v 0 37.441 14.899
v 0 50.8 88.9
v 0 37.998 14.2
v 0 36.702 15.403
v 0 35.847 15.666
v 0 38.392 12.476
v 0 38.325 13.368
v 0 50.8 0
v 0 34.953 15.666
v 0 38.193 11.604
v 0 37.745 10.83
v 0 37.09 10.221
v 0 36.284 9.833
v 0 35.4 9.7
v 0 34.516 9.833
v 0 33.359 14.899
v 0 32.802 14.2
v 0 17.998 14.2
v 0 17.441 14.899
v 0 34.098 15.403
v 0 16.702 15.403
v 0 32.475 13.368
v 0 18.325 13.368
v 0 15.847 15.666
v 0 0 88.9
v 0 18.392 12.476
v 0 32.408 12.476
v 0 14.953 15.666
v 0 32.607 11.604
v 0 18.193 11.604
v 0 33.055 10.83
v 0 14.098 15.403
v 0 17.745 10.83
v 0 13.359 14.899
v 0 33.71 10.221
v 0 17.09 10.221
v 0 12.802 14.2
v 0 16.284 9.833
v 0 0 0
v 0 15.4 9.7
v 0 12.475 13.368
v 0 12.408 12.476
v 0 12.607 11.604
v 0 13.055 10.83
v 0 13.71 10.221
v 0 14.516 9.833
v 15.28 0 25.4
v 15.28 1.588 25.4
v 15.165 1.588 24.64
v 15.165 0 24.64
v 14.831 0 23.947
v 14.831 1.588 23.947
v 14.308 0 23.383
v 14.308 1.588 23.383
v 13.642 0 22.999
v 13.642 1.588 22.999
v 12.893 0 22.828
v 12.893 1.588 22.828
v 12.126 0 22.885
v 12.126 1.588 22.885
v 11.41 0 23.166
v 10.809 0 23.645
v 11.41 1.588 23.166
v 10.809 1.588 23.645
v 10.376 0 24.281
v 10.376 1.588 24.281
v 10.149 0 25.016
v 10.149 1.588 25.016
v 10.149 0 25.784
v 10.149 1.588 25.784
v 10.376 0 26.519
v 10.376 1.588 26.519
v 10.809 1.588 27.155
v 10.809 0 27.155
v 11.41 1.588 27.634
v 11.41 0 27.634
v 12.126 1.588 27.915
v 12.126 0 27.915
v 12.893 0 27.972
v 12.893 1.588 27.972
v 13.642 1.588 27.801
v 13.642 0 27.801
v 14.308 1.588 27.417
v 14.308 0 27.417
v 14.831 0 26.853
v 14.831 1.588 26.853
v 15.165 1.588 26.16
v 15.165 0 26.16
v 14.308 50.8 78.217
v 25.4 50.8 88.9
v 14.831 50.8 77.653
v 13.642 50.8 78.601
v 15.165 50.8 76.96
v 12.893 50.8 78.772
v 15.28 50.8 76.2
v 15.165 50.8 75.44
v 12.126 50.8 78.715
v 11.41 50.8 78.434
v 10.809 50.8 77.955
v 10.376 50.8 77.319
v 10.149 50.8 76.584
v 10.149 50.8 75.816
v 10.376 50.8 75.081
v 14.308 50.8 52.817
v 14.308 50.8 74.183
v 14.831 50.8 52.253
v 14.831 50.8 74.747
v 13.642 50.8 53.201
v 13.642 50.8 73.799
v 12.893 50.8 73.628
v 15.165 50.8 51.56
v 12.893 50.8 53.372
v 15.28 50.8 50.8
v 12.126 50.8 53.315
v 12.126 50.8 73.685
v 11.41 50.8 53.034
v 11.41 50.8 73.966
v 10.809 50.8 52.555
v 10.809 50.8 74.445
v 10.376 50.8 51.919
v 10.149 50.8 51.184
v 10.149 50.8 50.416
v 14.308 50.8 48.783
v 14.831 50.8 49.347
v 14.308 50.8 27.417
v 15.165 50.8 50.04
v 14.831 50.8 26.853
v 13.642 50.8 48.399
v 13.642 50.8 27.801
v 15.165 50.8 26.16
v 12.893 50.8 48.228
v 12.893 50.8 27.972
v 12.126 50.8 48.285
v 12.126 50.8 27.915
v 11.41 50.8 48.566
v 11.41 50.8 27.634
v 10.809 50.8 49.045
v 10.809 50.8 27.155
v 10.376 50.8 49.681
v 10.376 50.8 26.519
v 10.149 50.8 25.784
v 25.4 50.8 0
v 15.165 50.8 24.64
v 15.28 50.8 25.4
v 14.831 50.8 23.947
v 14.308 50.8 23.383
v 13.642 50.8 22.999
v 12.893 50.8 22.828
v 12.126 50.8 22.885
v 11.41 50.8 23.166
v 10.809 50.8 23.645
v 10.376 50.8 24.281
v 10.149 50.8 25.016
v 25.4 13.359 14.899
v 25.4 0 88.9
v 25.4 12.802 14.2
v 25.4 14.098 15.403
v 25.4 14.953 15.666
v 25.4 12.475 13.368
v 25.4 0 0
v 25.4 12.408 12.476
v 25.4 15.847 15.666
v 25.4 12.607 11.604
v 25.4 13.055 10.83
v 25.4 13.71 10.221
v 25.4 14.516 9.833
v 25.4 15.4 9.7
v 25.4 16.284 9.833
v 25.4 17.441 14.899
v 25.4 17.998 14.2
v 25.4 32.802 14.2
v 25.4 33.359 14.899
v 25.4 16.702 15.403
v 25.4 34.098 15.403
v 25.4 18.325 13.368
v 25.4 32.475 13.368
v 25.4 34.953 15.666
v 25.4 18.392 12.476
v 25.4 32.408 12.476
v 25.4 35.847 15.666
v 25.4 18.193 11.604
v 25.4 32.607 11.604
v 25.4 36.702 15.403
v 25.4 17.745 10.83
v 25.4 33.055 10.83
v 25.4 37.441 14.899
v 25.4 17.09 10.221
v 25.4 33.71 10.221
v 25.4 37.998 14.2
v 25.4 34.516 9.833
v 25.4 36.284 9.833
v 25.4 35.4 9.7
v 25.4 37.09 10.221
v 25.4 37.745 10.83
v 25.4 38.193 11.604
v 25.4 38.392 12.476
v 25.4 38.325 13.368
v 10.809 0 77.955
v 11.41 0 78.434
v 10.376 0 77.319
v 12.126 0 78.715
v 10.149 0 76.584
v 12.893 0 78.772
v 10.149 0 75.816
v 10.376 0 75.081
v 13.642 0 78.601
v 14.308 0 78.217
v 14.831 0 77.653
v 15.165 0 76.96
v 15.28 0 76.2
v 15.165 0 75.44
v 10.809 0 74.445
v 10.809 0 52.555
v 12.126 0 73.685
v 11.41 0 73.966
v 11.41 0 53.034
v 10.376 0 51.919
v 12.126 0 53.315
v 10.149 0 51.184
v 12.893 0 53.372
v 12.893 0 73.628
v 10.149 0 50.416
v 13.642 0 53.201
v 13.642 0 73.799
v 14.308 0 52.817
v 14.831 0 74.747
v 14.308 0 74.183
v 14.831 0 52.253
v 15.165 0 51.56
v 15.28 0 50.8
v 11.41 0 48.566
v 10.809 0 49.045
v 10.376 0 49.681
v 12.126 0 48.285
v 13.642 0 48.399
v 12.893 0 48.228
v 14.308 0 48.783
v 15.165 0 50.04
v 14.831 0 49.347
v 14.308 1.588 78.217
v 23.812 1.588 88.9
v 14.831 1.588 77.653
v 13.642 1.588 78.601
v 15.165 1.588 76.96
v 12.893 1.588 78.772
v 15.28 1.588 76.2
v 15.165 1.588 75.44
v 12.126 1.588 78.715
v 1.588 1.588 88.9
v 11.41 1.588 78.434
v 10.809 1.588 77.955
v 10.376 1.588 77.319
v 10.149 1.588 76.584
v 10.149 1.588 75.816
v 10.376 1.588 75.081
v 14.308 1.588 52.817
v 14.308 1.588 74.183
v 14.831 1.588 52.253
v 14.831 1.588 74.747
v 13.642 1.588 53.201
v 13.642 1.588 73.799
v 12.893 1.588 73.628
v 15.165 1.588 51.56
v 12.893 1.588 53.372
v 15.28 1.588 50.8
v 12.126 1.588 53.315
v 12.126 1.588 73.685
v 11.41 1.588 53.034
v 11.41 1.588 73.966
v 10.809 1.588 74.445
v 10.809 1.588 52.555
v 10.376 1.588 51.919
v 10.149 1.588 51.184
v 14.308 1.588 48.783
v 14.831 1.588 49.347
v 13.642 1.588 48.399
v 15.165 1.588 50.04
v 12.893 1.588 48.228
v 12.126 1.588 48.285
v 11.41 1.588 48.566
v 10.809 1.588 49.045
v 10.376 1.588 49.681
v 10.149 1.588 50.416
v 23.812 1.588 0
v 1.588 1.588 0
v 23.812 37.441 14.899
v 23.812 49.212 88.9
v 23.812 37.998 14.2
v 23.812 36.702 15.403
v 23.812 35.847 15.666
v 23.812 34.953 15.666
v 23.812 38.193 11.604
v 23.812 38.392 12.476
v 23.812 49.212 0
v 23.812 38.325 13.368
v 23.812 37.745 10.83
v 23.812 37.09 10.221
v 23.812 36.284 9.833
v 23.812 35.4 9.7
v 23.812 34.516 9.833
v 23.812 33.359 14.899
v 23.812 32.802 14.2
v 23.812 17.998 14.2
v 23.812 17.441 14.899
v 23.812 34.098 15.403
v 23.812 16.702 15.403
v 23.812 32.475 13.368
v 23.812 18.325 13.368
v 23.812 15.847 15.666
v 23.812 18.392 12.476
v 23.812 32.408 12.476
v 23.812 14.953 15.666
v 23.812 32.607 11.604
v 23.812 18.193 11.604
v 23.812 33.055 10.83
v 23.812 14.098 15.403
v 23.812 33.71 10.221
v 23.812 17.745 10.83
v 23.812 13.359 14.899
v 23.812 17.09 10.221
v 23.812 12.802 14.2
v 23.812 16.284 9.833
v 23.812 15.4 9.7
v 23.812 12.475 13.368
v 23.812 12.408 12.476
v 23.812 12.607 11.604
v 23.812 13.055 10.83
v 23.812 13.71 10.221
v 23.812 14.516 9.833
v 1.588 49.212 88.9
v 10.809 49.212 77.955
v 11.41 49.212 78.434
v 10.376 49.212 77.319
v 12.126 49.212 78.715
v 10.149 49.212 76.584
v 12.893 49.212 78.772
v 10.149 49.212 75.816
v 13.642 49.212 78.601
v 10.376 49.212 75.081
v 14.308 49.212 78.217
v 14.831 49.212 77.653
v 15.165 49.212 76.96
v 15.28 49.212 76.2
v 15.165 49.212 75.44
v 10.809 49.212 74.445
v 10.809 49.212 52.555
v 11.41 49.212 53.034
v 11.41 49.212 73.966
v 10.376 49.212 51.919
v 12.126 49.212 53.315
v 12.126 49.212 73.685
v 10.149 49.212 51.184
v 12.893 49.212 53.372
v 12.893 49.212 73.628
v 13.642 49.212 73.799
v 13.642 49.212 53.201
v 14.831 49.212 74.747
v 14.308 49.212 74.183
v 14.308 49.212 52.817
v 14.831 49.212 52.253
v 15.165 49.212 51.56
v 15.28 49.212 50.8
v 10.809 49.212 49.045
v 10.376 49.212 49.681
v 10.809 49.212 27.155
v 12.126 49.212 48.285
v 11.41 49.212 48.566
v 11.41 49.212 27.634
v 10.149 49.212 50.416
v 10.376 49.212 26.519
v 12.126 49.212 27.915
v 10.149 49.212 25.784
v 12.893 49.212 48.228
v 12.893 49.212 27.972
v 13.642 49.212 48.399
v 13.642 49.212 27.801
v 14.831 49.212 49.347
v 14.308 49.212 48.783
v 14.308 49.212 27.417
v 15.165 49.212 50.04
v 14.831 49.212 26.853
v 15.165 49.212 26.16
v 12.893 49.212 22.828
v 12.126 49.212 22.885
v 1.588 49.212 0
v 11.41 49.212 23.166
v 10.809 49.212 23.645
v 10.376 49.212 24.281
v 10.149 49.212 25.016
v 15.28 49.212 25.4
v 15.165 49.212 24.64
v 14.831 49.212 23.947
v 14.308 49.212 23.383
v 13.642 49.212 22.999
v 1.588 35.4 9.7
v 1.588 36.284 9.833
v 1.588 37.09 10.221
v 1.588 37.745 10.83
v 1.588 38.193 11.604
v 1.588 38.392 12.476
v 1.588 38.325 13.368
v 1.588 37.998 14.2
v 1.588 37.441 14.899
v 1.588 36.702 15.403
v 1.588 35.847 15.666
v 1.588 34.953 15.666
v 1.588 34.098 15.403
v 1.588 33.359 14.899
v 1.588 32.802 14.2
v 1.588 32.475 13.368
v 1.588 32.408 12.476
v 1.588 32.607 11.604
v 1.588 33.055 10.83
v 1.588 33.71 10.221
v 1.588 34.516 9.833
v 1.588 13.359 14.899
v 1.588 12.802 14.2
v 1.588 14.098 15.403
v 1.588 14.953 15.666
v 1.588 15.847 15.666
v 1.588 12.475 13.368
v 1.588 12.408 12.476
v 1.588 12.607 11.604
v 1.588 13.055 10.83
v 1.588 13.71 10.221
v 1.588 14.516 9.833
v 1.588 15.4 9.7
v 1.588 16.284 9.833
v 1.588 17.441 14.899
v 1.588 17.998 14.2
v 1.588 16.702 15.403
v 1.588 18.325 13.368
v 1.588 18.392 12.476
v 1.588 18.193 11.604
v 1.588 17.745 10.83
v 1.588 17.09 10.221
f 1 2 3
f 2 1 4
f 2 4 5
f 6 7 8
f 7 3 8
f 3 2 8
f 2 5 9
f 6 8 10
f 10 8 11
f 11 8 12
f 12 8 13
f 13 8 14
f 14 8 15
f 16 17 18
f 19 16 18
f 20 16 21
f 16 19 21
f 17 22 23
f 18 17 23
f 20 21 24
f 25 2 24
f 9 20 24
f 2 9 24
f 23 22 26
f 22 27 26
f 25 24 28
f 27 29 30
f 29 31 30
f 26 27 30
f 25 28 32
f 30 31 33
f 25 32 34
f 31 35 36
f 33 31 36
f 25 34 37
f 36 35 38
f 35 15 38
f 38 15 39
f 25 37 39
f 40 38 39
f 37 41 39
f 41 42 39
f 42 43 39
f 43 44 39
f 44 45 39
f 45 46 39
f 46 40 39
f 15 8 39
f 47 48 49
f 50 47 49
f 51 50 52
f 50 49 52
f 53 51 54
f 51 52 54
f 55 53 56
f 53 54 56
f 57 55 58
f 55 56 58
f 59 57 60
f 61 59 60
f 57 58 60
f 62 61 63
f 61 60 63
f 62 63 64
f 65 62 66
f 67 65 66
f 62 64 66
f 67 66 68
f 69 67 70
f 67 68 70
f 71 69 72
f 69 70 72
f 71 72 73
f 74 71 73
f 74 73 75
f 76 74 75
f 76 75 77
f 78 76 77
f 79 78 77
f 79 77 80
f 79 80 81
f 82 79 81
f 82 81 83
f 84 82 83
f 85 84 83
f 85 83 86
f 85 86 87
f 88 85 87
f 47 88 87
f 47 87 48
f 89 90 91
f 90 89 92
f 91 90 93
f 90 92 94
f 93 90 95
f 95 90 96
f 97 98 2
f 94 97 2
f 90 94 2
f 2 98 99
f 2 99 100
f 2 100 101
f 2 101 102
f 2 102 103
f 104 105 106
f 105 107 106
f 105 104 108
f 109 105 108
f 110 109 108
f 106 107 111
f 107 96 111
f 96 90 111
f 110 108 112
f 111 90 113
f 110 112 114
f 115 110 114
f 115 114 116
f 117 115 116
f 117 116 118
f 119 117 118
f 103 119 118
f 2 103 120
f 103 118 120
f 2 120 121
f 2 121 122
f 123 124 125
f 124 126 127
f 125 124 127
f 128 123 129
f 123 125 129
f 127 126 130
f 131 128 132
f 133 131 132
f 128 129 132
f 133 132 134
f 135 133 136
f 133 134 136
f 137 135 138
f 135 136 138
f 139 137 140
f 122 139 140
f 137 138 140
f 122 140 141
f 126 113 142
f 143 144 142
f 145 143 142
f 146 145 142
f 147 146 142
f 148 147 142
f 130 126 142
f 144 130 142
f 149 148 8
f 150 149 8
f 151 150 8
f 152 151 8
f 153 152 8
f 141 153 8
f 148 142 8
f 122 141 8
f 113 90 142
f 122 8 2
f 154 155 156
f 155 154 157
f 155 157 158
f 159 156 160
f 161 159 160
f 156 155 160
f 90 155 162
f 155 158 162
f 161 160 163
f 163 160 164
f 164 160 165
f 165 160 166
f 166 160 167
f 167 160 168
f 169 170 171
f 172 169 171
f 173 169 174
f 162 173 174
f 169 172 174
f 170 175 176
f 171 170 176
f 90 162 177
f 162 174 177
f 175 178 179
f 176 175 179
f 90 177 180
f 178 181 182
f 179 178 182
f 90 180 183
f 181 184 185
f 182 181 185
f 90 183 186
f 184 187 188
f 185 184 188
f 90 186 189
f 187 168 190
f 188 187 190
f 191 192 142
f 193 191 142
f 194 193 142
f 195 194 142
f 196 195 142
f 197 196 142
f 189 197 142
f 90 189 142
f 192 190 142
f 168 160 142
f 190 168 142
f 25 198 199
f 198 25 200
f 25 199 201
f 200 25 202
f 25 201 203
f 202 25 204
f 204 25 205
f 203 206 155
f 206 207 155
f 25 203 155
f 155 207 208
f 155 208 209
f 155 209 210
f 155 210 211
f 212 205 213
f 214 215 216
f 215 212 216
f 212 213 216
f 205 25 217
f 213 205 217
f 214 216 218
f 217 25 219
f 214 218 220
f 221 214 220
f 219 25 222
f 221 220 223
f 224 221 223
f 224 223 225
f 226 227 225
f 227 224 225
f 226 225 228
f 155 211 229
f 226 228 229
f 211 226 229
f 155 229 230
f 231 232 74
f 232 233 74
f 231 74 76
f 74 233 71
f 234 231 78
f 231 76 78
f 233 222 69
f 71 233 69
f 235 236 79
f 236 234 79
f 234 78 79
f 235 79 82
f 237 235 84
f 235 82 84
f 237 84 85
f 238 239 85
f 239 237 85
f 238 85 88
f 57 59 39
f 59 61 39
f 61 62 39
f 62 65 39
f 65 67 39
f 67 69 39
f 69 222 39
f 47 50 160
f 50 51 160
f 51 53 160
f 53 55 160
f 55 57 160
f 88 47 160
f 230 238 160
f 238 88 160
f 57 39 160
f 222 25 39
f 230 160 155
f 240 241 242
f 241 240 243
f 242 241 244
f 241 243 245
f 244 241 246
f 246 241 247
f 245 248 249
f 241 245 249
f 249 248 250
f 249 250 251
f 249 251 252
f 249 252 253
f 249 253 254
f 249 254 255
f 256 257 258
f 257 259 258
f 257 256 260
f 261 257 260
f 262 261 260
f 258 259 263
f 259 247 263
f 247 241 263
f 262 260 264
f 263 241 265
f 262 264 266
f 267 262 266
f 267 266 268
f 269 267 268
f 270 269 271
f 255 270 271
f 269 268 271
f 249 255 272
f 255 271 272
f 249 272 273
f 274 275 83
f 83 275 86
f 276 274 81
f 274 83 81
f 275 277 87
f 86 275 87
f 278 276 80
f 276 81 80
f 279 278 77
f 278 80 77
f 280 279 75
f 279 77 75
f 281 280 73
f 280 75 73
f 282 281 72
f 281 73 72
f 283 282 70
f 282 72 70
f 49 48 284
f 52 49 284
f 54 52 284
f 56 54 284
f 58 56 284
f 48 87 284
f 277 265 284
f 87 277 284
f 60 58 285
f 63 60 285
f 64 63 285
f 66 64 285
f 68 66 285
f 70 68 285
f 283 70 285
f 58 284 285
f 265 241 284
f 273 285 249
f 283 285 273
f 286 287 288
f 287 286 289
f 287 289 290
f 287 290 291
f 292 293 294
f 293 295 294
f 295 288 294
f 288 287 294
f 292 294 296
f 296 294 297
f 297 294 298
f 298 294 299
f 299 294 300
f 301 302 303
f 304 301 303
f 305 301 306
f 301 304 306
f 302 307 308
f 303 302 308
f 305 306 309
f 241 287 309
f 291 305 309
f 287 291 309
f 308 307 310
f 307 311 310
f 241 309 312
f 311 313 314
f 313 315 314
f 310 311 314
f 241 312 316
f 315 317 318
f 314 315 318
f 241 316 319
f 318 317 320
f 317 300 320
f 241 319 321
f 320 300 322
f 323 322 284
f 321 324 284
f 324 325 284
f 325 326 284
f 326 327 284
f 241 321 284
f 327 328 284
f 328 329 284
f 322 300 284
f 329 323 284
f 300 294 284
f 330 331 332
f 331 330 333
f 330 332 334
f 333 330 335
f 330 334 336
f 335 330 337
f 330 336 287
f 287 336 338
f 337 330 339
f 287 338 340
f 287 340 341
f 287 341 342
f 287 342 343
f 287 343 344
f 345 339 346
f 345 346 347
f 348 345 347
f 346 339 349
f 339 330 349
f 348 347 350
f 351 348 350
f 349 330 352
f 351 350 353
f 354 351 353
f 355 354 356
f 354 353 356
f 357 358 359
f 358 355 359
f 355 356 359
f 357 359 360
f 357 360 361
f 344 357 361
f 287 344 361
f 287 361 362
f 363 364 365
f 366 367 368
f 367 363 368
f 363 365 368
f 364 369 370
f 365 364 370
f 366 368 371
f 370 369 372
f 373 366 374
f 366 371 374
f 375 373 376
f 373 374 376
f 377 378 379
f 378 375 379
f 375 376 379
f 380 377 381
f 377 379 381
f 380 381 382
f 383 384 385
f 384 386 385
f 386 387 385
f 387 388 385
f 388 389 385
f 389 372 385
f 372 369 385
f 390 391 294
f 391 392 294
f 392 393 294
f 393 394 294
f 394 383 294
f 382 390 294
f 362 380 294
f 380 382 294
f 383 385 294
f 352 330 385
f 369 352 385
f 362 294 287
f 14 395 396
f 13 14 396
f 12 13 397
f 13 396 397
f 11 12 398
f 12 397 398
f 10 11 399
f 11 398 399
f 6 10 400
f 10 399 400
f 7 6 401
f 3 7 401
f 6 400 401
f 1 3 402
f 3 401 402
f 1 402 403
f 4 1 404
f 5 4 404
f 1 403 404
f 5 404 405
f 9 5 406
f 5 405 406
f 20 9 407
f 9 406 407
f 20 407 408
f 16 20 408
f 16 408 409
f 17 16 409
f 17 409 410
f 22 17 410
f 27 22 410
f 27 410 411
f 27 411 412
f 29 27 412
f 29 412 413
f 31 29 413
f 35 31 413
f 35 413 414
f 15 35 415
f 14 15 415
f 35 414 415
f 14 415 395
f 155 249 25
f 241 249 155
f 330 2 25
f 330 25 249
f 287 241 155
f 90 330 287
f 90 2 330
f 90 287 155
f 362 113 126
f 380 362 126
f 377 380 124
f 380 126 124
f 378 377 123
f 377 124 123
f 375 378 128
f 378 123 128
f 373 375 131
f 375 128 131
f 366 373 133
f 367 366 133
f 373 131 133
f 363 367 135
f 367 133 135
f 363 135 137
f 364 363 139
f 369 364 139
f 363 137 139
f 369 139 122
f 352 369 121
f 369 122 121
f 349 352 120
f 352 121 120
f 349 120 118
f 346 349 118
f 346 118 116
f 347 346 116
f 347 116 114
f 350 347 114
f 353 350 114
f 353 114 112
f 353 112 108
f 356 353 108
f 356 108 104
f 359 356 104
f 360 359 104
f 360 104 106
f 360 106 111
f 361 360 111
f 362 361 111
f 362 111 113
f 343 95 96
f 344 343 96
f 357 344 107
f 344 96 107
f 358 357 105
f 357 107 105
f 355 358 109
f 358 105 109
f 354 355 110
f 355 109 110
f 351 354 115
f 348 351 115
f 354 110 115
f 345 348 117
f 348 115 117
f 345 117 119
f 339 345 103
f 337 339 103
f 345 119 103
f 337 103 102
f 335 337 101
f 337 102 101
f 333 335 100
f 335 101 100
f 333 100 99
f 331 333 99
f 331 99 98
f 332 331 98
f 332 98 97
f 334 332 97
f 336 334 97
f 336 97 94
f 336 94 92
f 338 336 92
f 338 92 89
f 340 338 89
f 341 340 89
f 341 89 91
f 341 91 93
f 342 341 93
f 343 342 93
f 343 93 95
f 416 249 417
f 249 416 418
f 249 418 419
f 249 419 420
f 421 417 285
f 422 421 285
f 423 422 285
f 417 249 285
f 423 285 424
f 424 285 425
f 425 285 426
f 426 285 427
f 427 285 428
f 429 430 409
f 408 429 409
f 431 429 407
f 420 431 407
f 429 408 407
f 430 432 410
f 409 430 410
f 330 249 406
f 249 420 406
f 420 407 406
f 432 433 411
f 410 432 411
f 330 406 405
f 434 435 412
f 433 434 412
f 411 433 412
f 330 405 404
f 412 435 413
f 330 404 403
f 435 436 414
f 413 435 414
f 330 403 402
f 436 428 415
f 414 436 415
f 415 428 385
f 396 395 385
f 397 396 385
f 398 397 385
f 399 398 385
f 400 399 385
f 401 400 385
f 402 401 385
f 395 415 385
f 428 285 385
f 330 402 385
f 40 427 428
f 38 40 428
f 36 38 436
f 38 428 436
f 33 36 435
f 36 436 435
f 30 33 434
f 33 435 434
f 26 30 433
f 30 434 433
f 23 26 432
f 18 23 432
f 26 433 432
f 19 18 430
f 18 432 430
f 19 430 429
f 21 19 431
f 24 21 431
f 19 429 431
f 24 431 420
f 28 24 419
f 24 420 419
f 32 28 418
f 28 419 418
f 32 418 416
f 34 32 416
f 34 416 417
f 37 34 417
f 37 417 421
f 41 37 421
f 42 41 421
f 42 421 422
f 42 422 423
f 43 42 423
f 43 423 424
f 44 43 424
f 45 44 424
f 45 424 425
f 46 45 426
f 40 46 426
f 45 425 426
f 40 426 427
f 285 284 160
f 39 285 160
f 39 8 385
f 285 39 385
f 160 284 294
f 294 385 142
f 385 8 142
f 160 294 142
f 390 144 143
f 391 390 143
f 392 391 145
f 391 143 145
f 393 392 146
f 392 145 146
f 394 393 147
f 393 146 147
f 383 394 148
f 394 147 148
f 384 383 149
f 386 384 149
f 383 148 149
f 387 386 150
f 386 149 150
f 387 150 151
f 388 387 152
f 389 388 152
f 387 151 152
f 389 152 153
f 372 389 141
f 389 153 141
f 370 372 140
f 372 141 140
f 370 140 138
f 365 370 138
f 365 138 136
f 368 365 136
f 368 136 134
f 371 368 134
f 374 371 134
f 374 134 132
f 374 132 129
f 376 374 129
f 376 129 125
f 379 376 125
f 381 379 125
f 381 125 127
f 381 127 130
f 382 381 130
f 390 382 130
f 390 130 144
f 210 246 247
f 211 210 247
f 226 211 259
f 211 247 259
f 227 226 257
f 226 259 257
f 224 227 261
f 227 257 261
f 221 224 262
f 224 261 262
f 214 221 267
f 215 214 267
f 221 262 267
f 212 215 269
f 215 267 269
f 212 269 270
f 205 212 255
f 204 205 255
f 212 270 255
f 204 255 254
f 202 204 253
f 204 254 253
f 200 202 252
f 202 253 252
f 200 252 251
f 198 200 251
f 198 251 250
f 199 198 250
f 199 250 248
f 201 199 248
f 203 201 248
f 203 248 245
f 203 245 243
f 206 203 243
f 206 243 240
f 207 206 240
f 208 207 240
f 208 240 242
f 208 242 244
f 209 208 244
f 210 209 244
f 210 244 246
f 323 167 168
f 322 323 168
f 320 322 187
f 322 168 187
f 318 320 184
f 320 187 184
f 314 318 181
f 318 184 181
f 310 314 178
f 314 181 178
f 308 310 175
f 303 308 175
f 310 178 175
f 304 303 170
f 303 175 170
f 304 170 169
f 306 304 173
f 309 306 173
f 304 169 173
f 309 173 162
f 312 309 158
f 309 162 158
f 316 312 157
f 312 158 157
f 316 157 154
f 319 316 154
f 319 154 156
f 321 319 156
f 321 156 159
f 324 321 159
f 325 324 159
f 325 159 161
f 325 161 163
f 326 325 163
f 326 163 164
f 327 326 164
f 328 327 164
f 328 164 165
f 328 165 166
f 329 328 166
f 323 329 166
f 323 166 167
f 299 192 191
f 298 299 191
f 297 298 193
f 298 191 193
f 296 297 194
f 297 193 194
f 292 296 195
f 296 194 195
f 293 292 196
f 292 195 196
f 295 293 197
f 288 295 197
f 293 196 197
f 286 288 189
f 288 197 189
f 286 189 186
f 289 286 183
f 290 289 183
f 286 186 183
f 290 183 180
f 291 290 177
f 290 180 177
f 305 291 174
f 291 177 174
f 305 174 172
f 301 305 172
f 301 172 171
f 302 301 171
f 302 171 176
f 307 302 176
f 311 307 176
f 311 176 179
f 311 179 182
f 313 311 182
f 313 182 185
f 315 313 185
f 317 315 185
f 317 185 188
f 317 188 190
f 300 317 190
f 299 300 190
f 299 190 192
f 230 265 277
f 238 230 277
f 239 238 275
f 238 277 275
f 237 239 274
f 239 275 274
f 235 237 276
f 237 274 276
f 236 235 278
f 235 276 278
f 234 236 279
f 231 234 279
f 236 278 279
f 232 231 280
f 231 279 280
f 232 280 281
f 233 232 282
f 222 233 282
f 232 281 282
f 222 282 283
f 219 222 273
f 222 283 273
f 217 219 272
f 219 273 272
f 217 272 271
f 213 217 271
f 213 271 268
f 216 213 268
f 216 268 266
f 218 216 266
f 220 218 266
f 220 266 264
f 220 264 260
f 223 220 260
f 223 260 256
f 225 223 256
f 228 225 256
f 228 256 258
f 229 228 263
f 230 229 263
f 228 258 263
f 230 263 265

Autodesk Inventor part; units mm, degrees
ref_plane "YZ Plane" through (0, 0, 0) normal (1, 0, 0) x (0, 1, 0)
ref_plane "XZ Plane" through (0, 0, 0) normal (0, 1, 0) x (-1, 0, 0)
ref_plane "XY Plane" through (0, 0, 0) normal (0, 0, 1) x (1, 0, 0)
sketch "Sketch1" plane through (0, 0, 0) normal (0, 0, 1) x (1, 0, 0)
  line L0 (0, 0) -> (25.4, 0)
  line L1 (25.4, 0) -> (25.4, 50.8)
  line L2 (25.4, 50.8) -> (0, 50.8)
  line L3 (0, 50.8) -> (0, 0)
  line L4 (1.5875, 49.2125) -> (23.8125, 49.2125)
  line L5 (23.8125, 49.2125) -> (23.8125, 1.5875)
  line L6 (23.8125, 1.5875) -> (1.5875, 1.5875)
  line L7 (1.5875, 1.5875) -> (1.5875, 49.2125)
  dimension "d0" = 25.4
  dimension "d1" = 50.8
  dimension "d2" = 1.5875
extrude "Extrusion1" add sketch "Sketch1" along normal blind 88.9
sketch "Sketch2" plane through (25.4, 0, 0) normal (1, 0, 0) x (0, 0, -1)
  line L0 (0, 0) -> (0, 50.8) construction
  line L1 (0, 50.8) -> (-12.7, 50.8) construction
  line L2 (0, 50.8) -> (-88.9, 50.8) construction
  line L3 (0, 25.4) -> (-12.7, 25.4) construction
  line L4 (-12.7, 25.4) -> (-12.7, 35.4) construction
  line L5 (-12.7, 35.4) -> (-12.7, 15.4) construction
  circle A0 centre (-12.7, 35.4) radius 3
  circle A1 centre (-12.7, 15.4) radius 3
  dimension "d5" = 12.7
  dimension "d6" = 10
  dimension "d7" = 20
  dimension "d8" = 6
extrude "Extrusion2" cut sketch "Sketch2" against normal blind 88.9
sketch "Sketch3" plane through (0, 50.8, 0) normal (0, 1, 0) x (1, 0, 0)
  line L0 (1.5875, -88.9) -> (23.8125, -88.9) construction
  line L1 (12.7, -88.9) -> (12.7, -76.2) construction
  line L2 (12.7, -76.2) -> (12.7, -50.8) construction
  line L3 (12.7, -50.8) -> (12.7, -25.4) construction
  circle A0 centre (12.7, -76.2) radius 2.5797
  circle A1 centre (12.7, -50.8) radius 2.5797
  circle A2 centre (12.7, -25.4) radius 2.5797
  point P0 (0, 0)
  dimension "d11" = 12.7
  dimension "d12" = 25.4
  dimension "d13" = 25.4
  dimension "d14" = 5.1594
extrude "Extrusion3" cut sketch "Sketch3" against normal blind 88.9
properties part number "Bumper attachment frame"
